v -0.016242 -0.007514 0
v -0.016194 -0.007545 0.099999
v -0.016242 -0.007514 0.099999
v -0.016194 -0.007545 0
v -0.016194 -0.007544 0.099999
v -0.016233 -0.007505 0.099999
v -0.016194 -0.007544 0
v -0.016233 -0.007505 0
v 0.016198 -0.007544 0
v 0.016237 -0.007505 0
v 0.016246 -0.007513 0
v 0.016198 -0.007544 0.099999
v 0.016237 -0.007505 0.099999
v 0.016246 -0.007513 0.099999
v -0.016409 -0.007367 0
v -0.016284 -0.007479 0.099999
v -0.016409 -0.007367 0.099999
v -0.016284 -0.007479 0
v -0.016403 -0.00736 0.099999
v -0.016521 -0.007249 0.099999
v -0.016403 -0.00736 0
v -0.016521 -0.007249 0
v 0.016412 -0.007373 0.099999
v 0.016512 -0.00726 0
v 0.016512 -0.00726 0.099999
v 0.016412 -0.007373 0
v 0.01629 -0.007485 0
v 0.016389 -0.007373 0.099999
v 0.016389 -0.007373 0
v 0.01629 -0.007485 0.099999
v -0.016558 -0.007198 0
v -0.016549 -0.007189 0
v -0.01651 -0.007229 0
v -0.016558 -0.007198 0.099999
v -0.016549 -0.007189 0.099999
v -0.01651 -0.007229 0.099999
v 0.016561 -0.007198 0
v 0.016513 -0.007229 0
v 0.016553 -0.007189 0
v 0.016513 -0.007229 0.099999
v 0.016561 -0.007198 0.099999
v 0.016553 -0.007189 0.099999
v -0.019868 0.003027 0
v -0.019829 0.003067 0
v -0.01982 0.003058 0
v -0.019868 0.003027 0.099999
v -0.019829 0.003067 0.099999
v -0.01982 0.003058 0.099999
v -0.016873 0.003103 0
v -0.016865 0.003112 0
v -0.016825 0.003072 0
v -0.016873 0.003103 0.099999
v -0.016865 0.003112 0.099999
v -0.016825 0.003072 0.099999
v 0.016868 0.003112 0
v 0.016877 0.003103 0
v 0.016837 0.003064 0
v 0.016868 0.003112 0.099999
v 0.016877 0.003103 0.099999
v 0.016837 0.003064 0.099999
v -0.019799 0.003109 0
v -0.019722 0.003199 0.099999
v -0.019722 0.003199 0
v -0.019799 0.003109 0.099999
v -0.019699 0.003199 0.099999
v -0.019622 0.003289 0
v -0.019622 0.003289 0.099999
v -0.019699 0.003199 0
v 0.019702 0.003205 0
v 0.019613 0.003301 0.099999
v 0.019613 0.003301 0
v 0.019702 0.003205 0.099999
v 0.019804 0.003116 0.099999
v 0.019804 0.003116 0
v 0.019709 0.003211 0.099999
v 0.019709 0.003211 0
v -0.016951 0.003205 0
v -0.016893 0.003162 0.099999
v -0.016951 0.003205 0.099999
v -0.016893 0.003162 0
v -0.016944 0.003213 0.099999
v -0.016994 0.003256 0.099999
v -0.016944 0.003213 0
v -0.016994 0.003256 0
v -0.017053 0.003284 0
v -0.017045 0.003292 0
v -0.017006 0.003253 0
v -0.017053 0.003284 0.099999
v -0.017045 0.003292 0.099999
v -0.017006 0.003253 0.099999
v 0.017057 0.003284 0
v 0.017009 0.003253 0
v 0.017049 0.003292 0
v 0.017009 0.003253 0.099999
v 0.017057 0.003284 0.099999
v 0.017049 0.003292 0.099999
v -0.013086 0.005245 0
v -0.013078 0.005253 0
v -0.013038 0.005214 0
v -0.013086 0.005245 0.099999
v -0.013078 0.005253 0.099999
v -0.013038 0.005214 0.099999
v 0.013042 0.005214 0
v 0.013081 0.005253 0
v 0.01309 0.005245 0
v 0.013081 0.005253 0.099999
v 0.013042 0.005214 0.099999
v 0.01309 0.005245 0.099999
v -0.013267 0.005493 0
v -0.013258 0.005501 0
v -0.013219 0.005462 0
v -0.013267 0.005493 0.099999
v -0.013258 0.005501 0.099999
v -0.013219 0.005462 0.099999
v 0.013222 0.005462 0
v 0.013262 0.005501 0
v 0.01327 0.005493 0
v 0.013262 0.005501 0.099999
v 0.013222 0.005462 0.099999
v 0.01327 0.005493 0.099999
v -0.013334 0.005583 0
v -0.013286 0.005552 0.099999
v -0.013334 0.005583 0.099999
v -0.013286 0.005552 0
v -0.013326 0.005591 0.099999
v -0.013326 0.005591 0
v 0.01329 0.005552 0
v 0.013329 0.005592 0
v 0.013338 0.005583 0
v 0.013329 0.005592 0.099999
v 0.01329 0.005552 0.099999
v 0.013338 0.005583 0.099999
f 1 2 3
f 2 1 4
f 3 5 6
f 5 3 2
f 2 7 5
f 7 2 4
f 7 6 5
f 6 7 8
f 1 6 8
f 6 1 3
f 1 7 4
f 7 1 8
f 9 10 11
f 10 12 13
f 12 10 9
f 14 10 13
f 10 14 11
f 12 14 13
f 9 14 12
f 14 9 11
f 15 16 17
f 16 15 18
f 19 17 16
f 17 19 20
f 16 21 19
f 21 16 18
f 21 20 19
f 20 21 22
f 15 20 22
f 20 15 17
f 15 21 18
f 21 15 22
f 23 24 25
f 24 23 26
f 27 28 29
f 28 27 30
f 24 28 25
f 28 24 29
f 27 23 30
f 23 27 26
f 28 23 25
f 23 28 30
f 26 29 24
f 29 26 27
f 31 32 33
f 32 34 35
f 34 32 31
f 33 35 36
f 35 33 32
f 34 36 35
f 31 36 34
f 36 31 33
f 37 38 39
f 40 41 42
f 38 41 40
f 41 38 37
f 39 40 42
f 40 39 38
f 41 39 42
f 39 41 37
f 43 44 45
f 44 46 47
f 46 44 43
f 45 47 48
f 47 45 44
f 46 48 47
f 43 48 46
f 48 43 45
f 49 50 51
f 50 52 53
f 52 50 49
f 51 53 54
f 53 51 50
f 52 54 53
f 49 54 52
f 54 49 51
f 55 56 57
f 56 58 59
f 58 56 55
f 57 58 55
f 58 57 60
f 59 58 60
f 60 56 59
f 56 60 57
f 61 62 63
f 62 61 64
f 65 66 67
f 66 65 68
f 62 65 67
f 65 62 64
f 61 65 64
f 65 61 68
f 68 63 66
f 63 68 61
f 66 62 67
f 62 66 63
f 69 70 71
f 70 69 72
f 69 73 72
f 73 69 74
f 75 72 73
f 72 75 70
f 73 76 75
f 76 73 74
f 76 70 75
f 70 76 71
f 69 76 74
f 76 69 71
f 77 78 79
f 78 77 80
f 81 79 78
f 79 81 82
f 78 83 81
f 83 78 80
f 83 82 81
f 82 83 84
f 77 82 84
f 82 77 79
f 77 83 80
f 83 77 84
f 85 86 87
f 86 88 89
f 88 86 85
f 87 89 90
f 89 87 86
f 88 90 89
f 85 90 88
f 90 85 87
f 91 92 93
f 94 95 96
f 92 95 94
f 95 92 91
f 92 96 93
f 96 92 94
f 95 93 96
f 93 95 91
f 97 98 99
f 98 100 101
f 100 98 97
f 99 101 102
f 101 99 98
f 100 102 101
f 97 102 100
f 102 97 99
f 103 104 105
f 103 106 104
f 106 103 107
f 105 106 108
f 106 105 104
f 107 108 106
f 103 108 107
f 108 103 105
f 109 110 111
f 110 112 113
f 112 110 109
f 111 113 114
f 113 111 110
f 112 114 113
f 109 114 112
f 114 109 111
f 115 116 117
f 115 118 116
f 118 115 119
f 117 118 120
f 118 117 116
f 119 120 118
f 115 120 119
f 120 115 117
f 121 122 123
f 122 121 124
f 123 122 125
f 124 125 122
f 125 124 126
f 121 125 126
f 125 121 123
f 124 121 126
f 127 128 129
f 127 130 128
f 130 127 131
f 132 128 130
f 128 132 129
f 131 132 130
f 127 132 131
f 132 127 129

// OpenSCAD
// Module names are of the form poly_<inkscape-path-id>().
// As a result you can associate a polygon in this OpenSCAD program with the
//  corresponding SVG element in the Inkscape document by looking for 
//  the XML element with the attribute id="inkscape-path-id".

// Paths have their own variables so they can be imported and used 
//  in polygon(points) structures in other programs.
// The NN_points is the list of all polygon XY vertices. 
// There may be an NN_paths variable as well. If it exists then it 
//  defines the nested paths. Both must be used in the 
//  polygon(points, paths) variant of the command.

Rail_Length = 100; //[1:1000]
    //Rail Length

/* [Hidden] */
profile_scale = 0.00081464002277141552302609575900030900991200121074907109924326770034023161126198515815847043291339169752789904632594341946365881760550373944832690714073227976779886371810300363975250103716194210393379334966466045163110500407735007025061232435585420288782965358137865140675882038360423316191322534868752932775556065779010844688920052532786226821690090756075392356443098617156690070701381886006997776941027860387693319506114702867952557261451099027928095132644439958277841263903822494815835290368075767258504151456363725213331180875138298107756731593094399033021637756158492573299361290387143134838476385702088408939587824142992457378943049675295818262392685143995282595065997580823270906266232724671853805416242533078791307442223552040174597217840094765776241643713732104089811779695580314854103252025368783878654821291488100348121313731248369379650902736107188178232447503860496367341394120576976228335891104896500555841054643711048609111589046463606931487253032609240412858175663079766820762703981801110889536931900572758670581387562666574895800580508223259365705764219757043002703813294882971316609563353011354763278729248344544028664482972969349398651727840541503980734936639062067522963803142510185121563655678719288248540078300427761423816241466373064406305748579962284491818130310055222276855687944927217213119889384865675674776790152901936598468738684771130782849519542589544953758993997510420866474114089734837365258307762836245214365973069610446989432586507419826831736253401708799117294969512382351486498216230576681405075327315686742503561634563841541909758891857611567857271301572595730999595514415440636593042155578222695524263262245493425642830169248957275607993208707236504554134413228511853540333155440843062414273260879232671015430964627763219604583864876408828189605944323318500834363933213735032240201024  ; //made in inkscape in mm

// helper functions to determine the X,Y dimensions of the profiles
function min_x(shape_points) = min([ for (x = shape_points) min(x[0])]);
function max_x(shape_points) = max([ for (x = shape_points) max(x[0])]);
function min_y(shape_points) = min([ for (x = shape_points) min(x[1])]);
function max_y(shape_points) = max([ for (x = shape_points) max(x[1])]);



height = Rail_Length*0.00100000249677948179063128876147533399919441764529342938400820585490995655279215866364035002747884582512842794930304804300535562945196122610324173374804477294933494478609441892473711390116544747113049603176652207166391968790217320423912487734926780876859305825363032886683226622392475537584851867724184056337192098521751192716928759721972625519290159030299560658597043095759800970751613303608555919754362258618614177137076206613497125511722881524338869786628884938489675874422985778165609762646605128781718498046507655344112256891030832452331041590500399989475224134254727715810349759602498830629633393917276656395953019350516762175016124997209089474262785747458973147099075697835012265593269770519513250345295624493458814551938744598077350573268643478925668343093763790468853936284269087911338578156630134161323586548027798465125192466654544725610398315501669835989911674814466211081996769970637328490727395472; //[1:1000]

linear_extrude(height = height, center = true);

width = 1.0;


path32_0_points = [[-18.928370,9.610490],[-19.054679,9.599590],[-19.177430,9.582790],[-19.233460,9.570090],[-19.283690,9.547990],[-19.294990,9.532790],[-19.449573,9.492490],[-19.474513,9.481790],[-20.142312,9.064750],[-20.559348,8.396960],[-20.570028,8.372060],[-20.610358,8.217480],[-20.625308,8.205980],[-20.648428,8.142580],[-20.661618,8.072980],[-20.677368,7.963480],[-20.688138,7.850900],[-20.708888,7.763600],[-20.688138,7.676400],[-20.677208,7.550090],[-20.660448,7.427340],[-20.647718,7.371340],[-20.636808,7.314240],[-20.612048,7.210310],[-20.630808,7.102680],[-20.664898,6.971090],[-20.674958,6.957390],[-20.720238,6.832720],[-20.736648,6.822720],[-20.757338,6.785420],[-20.764838,6.740020],[-20.803268,6.611120],[-20.813328,6.597420],[-20.858608,6.472750],[-20.868668,6.459050],[-20.913948,6.334380],[-20.930358,6.324380],[-20.951048,6.287080],[-20.958548,6.241680],[-20.996978,6.112770],[-21.007038,6.099070],[-21.052318,5.974400],[-21.062378,5.960700],[-21.107658,5.836030],[-21.124068,5.826030],[-21.144758,5.788730],[-21.152258,5.743330],[-21.190688,5.614420],[-21.200748,5.600720],[-21.246028,5.476050],[-21.256088,5.462350],[-21.301368,5.337680],[-21.317778,5.327680],[-21.338468,5.290380],[-21.345968,5.244980],[-21.384398,5.116080],[-21.394458,5.102380],[-21.439738,4.977710],[-21.449798,4.964010],[-21.495078,4.839340],[-21.511488,4.829340],[-21.532178,4.792040],[-21.539678,4.746640],[-21.578108,4.617730],[-21.588168,4.604030],[-21.633448,4.479360],[-21.649858,4.469360],[-21.670548,4.432060],[-21.678048,4.386660],[-21.716478,4.257750],[-21.726538,4.244050],[-21.771818,4.119380],[-21.781878,4.105680],[-21.827158,3.981010],[-21.843568,3.971010],[-21.864258,3.933710],[-21.871758,3.888310],[-21.910188,3.759410],[-21.920248,3.745710],[-21.965528,3.621040],[-21.975588,3.607340],[-22.020868,3.482670],[-22.037278,3.472670],[-22.057968,3.435370],[-22.065468,3.389970],[-22.103898,3.261060],[-22.113958,3.247360],[-22.159238,3.122690],[-22.169298,3.108990],[-22.214578,2.984320],[-22.230988,2.974320],[-22.251678,2.937020],[-22.259178,2.891620],[-22.297608,2.762710],[-22.307668,2.749010],[-22.352948,2.624340],[-22.363008,2.610640],[-22.408288,2.485970],[-22.424698,2.475970],[-22.445388,2.438670],[-22.452888,2.393270],[-22.491318,2.264360],[-22.501378,2.250660],[-22.546658,2.125990],[-22.556718,2.112290],[-22.601998,1.987620],[-22.618408,1.977620],[-22.639098,1.940320],[-22.646598,1.894920],[-22.685028,1.766020],[-22.695088,1.752320],[-22.740368,1.627650],[-22.756778,1.617650],[-22.777468,1.580350],[-22.784968,1.534950],[-22.823398,1.406040],[-22.833458,1.392340],[-22.878738,1.267670],[-22.888798,1.253970],[-22.934078,1.129300],[-22.950488,1.119300],[-22.971178,1.082000],[-22.978678,1.036600],[-23.017108,0.907690],[-23.027168,0.893990],[-23.072448,0.769320],[-23.082508,0.755620],[-23.127788,0.630950],[-23.144198,0.620950],[-23.164888,0.583650],[-23.172388,0.538250],[-23.210818,0.409350],[-23.220878,0.395650],[-23.266158,0.270980],[-23.276218,0.257280],[-23.321498,0.132610],[-23.337908,0.122610],[-23.358598,0.085310],[-23.366098,0.039910],[-23.404528,-0.089000],[-23.414588,-0.102700],[-23.459868,-0.227370],[-23.469928,-0.241070],[-23.515208,-0.365740],[-23.531618,-0.375740],[-23.552308,-0.413040],[-23.559808,-0.458440],[-23.598238,-0.587350],[-23.608298,-0.601050],[-23.653578,-0.725720],[-23.669988,-0.735720],[-23.690678,-0.773020],[-23.698178,-0.818420],[-23.736608,-0.947330],[-23.746668,-0.961030],[-23.791948,-1.085700],[-23.802008,-1.099400],[-23.847288,-1.224070],[-23.863698,-1.234070],[-23.884388,-1.271370],[-23.891888,-1.316770],[-23.930318,-1.445680],[-23.940378,-1.459380],[-23.985658,-1.584050],[-23.995718,-1.597750],[-24.040998,-1.722420],[-24.057408,-1.732420],[-24.078098,-1.769720],[-24.085598,-1.815120],[-24.124028,-1.944030],[-24.134088,-1.957730],[-24.179368,-2.082400],[-24.189428,-2.096100],[-24.234708,-2.220770],[-24.251118,-2.230770],[-24.271808,-2.268070],[-24.279308,-2.313470],[-24.317738,-2.442380],[-24.327798,-2.456080],[-24.373078,-2.580750],[-24.383138,-2.594450],[-24.428418,-2.719120],[-24.444828,-2.729120],[-24.465518,-2.766420],[-24.473018,-2.811820],[-24.511448,-2.940720],[-24.520548,-2.955020],[-24.566328,-2.980720],[-24.559428,-3.312810],[-24.549628,-3.370610],[-24.532118,-3.423710],[-24.516158,-3.444510],[-24.254036,-3.910650],[-23.736295,-4.226230],[-23.714415,-4.242030],[-23.674305,-4.258130],[-23.632115,-4.270830],[-23.537635,-4.288530],[-23.438775,-4.299130],[-22.494028,-4.320430],[-21.549669,-4.298530],[-21.464519,-4.288130],[-21.382609,-4.272530],[-21.326929,-4.259230],[-21.273859,-4.241730],[-21.251629,-4.226330],[-20.779600,-3.945730],[-20.499001,-3.473700],[-20.483261,-3.451700],[-20.467161,-3.411600],[-20.453971,-3.369700],[-20.437711,-3.302000],[-20.425301,-3.231900],[-20.409551,-3.039300],[-20.394001,-2.846670],[-20.383091,-2.789570],[-20.369251,-2.734270],[-20.355411,-2.678970],[-20.341231,-2.623870],[-20.328811,-2.581470],[-20.315321,-2.539770],[-20.300071,-2.485270],[-20.286231,-2.429970],[-20.272391,-2.374670],[-20.258551,-2.319370],[-20.244711,-2.264070],[-20.230871,-2.208770],[-20.217031,-2.153470],[-20.203191,-2.098170],[-20.189351,-2.042870],[-20.175511,-1.987570],[-20.161671,-1.932270],[-20.147831,-1.876970],[-20.133991,-1.821570],[-20.119811,-1.766470],[-20.107391,-1.724070],[-20.093901,-1.682370],[-20.078651,-1.627870],[-20.064811,-1.572570],[-20.050971,-1.517270],[-20.037131,-1.461970],[-20.023291,-1.406670],[-20.009451,-1.351370],[-19.995611,-1.296070],[-19.981771,-1.240770],[-19.967931,-1.185470],[-19.954091,-1.130170],[-19.940251,-1.074870],[-19.926411,-1.019570],[-19.912571,-0.964270],[-19.898391,-0.909170],[-19.885971,-0.866770],[-19.872481,-0.825070],[-19.857231,-0.770570],[-19.843391,-0.715270],[-19.829551,-0.659970],[-19.815711,-0.604670],[-19.801871,-0.549370],[-19.788031,-0.494070],[-19.774191,-0.438770],[-19.760351,-0.383470],[-19.746511,-0.328170],[-19.732671,-0.272770],[-19.718831,-0.217470],[-19.704651,-0.162370],[-19.692231,-0.119970],[-19.678741,-0.078270],[-19.663491,-0.023770],[-19.649651,0.031530],[-19.635811,0.086830],[-19.621971,0.142130],[-19.608131,0.197430],[-19.594291,0.252730],[-19.580451,0.308030],[-19.566611,0.363330],[-19.552771,0.418630],[-19.538931,0.473930],[-19.525091,0.529230],[-19.511251,0.584530],[-19.497411,0.639830],[-19.483231,0.694930],[-19.470811,0.737330],[-19.457321,0.779030],[-19.442071,0.833530],[-19.428231,0.888830],[-19.414391,0.944130],[-19.400551,0.999430],[-19.386711,1.054730],[-19.372871,1.110030],[-19.359031,1.165330],[-19.345191,1.220630],[-19.331351,1.275930],[-19.317511,1.331330],[-19.303671,1.386630],[-19.289491,1.441730],[-19.277071,1.484130],[-19.263581,1.525830],[-19.248331,1.580330],[-19.234491,1.635630],[-19.220651,1.690930],[-19.206811,1.746230],[-19.192971,1.801530],[-19.179131,1.856830],[-19.165291,1.912130],[-19.151451,1.967430],[-19.137611,2.022730],[-19.123771,2.078030],[-19.109931,2.133330],[-19.096091,2.188630],[-19.082251,2.243930],[-19.068071,2.299030],[-19.055651,2.341430],[-19.042161,2.383130],[-19.026911,2.437630],[-19.013071,2.492930],[-18.999231,2.548230],[-18.985391,2.603530],[-18.971551,2.658830],[-18.957711,2.714130],[-18.943871,2.769430],[-18.930031,2.824730],[-18.916191,2.880030],[-18.902351,2.935430],[-18.888511,2.990730],[-18.874671,3.046030],[-18.860831,3.101330],[-18.846651,3.156430],[-18.834231,3.198830],[-18.820741,3.240530],[-18.805491,3.295030],[-18.791651,3.350330],[-18.777811,3.405630],[-18.763971,3.460930],[-18.750131,3.516230],[-18.736291,3.571530],[-18.722451,3.626830],[-18.708611,3.682130],[-18.694771,3.737430],[-18.680931,3.792730],[-18.667091,3.848030],[-18.652911,3.903130],[-18.640491,3.945530],[-18.627001,3.987230],[-18.611751,4.041730],[-18.597911,4.097030],[-18.584071,4.152330],[-18.570231,4.207630],[-18.556391,4.262930],[-18.542551,4.318230],[-18.528711,4.373530],[-18.514871,4.428830],[-18.501031,4.484130],[-18.487191,4.539530],[-18.473351,4.594830],[-18.459511,4.650130],[-18.445671,4.705430],[-18.431491,4.760530],[-18.419071,4.802930],[-18.405581,4.844630],[-18.390331,4.899130],[-18.376491,4.954430],[-18.362651,5.009730],[-18.348811,5.065030],[-18.334971,5.120330],[-18.321131,5.175630],[-18.307291,5.230930],[-18.293451,5.286230],[-18.279611,5.341530],[-18.265771,5.396830],[-18.251931,5.452130],[-18.238091,5.507430],[-18.224251,5.562730],[-18.210071,5.617830],[-18.197651,5.660230],[-18.184161,5.701930],[-18.168911,5.756430],[-18.155071,5.811730],[-18.141231,5.867030],[-18.127391,5.922330],[-18.113551,5.977630],[-18.099711,6.032930],[-18.085871,6.088230],[-18.072031,6.143630],[-18.058191,6.198930],[-18.044011,6.254030],[-18.031591,6.296430],[-18.017411,6.337730],[-18.004951,6.364430],[-17.991541,6.428630],[-17.983141,6.411430],[-17.971691,6.396130],[-17.951491,6.452530],[-17.767225,6.648970],[-17.678565,6.687770],[-17.647985,6.696770],[-17.618915,6.708370],[-17.577625,6.722570],[-17.533445,6.732570],[-17.346723,6.757670],[-17.160000,6.732570],[-17.115820,6.722570],[-17.074310,6.708770],[-17.032870,6.694970],[-16.955090,6.681270],[-16.973170,6.674270],[-16.988480,6.662870],[-16.930890,6.643170],[-16.857600,6.610470],[-16.876330,6.604470],[-16.836310,6.542170],[-16.768270,6.501870],[-16.820980,6.564170],[-16.760590,6.513170],[-16.716870,6.418670],[-16.701490,6.395070],[-16.687650,6.367370],[-16.676080,6.338270],[-16.661900,6.296970],[-16.649480,6.254570],[-16.635300,6.199470],[-16.624390,6.142270],[-16.606680,0.504150],[-16.613680,-5.149280],[-16.266531,-5.608320],[-15.902398,-6.067360],[-15.938128,-6.005060],[-15.990838,-5.942760],[-15.930448,-5.993760],[-15.886728,-6.088260],[-15.875638,-6.114560],[-15.847878,-6.136460],[-15.875638,-6.158360],[-15.886068,-6.186360],[-15.899478,-6.250460],[-15.907878,-6.233260],[-15.919328,-6.217960],[-15.939088,-6.275560],[-15.971788,-6.348860],[-15.980588,-6.337060],[-15.957478,-6.288660],[-16.159183,-6.589360],[-16.191803,-6.652160],[-16.201943,-6.641460],[-16.178573,-6.593060],[-16.463668,-7.004250],[-16.496178,-7.067250],[-16.502778,-7.051250],[-16.491258,-7.015450],[-16.597988,-7.144130],[-16.674738,-7.254880],[-16.614178,-7.352880],[-16.540398,-7.450880],[-16.546898,-7.418880],[-16.534248,-7.406980],[-16.518808,-7.454480],[-16.123793,-8.087300],[-16.131893,-8.055400],[-16.119243,-8.043500],[-16.103663,-8.090700],[-15.800061,-8.577750],[-15.811041,-8.542250],[-15.804441,-8.526250],[-15.771341,-8.588250],[-15.598808,-8.862050],[-15.620888,-8.813650],[-15.610748,-8.802950],[-15.577648,-8.864950],[-15.405116,-9.138750],[-15.427196,-9.090350],[-15.417056,-9.079650],[-15.383956,-9.141650],[-15.211424,-9.415450],[-15.233504,-9.367050],[-15.223364,-9.356350],[-15.189814,-9.417650],[-15.130344,-9.553090],[-15.016559,-9.631990],[-14.985789,-9.412960],[-14.976289,-9.238440],[-14.949339,-8.758570],[-14.978139,-8.680570],[-14.985539,-8.593570],[-14.999379,-8.510570],[-15.013219,-8.427570],[-15.027059,-8.344570],[-15.040899,-8.261570],[-15.055509,-8.179070],[-15.069099,-8.109770],[-15.083939,-8.041270],[-15.097479,-7.985770],[-15.111319,-7.930470],[-15.125159,-7.875170],[-15.138999,-7.819870],[-15.152839,-7.764570],[-15.166679,-7.709270],[-15.180519,-7.653970],[-15.194359,-7.598670],[-15.208199,-7.543370],[-15.222039,-7.488070],[-15.235879,-7.432770],[-15.247779,-7.376270],[-15.273529,-7.340870],[-15.247779,-7.305470],[-15.235879,-7.248970],[-15.221699,-7.193870],[-15.209279,-7.151470],[-15.195439,-7.109970],[-15.181599,-7.068470],[-15.168109,-7.026770],[-15.152859,-6.972270],[-15.138679,-6.917170],[-15.126259,-6.874770],[-15.112419,-6.833270],[-15.098579,-6.791770],[-15.084739,-6.750270],[-15.070899,-6.708770],[-15.057409,-6.667070],[-15.042159,-6.612570],[-15.027979,-6.557470],[-15.015559,-6.515070],[-15.001719,-6.473570],[-14.987879,-6.432070],[-14.974039,-6.390570],[-14.960199,-6.349070],[-14.953899,-6.302870],[-14.919749,-6.143790],[-14.952829,-6.109290],[-14.960229,-6.063790],[-14.974069,-6.022290],[-14.987909,-5.980790],[-15.001749,-5.939290],[-15.015589,-5.897790],[-15.029429,-5.856290],[-15.043269,-5.814790],[-15.057109,-5.773290],[-15.070949,-5.731790],[-15.080449,-5.687590],[-15.105559,-5.583880],[-15.084809,-5.477470],[-15.064059,-5.391870],[-15.034759,-5.293370],[-15.022359,-5.266070],[-14.991779,-5.257070],[-14.966949,-5.238670],[-14.957449,-5.221870],[-14.829941,-5.181170],[-14.802541,-5.172170],[-14.766511,0.442550],[-14.749091,6.058670],[-14.737171,6.129070],[-14.723041,6.198070],[-14.710211,6.254070],[-14.696031,6.309170],[-14.683611,6.351570],[-14.669431,6.392870],[-14.657861,6.421970],[-14.651661,6.454370],[-14.607931,6.550170],[-14.589911,6.593470],[-14.579901,6.577270],[-14.568451,6.561970],[-14.548051,6.617870],[-14.243476,6.918430],[-14.190776,6.939830],[-14.206346,6.950830],[-14.223566,6.958830],[-14.159416,6.972230],[-14.134066,6.986930],[-14.106396,7.000730],[-14.081566,7.019130],[-14.072066,7.035930],[-13.942283,7.072930],[-13.883233,7.080930],[-13.826793,7.093030],[-13.744123,7.107430],[-13.660413,7.120130],[0.002238,7.144330],[13.664878,7.120130],[13.748578,7.107430],[13.831278,7.093030],[13.887678,7.080930],[13.946678,7.072930],[14.076468,7.035930],[14.086468,7.019130],[14.111268,7.000730],[14.138968,6.986930],[14.164368,6.972230],[14.228468,6.958830],[14.211268,6.950830],[14.195668,6.939830],[14.248368,6.918430],[14.552948,6.617870],[14.573348,6.561970],[14.584748,6.577270],[14.594748,6.593470],[14.612748,6.550170],[14.656448,6.454370],[14.662448,6.421970],[14.674048,6.392870],[14.688248,6.351570],[14.700648,6.309170],[14.714848,6.254070],[14.727648,6.198070],[14.741748,6.129070],[14.753648,6.058670],[14.771048,0.442550],[14.807048,-5.172170],[14.834448,-5.181170],[14.961958,-5.221870],[14.971958,-5.238670],[14.996758,-5.257070],[15.027358,-5.266070],[15.039758,-5.293370],[15.069058,-5.391870],[15.089858,-5.477470],[15.110558,-5.583880],[15.085458,-5.687590],[15.075458,-5.731790],[15.061658,-5.773290],[15.047858,-5.814790],[15.034058,-5.856290],[15.020258,-5.897790],[15.006458,-5.939290],[14.992658,-5.980790],[14.978858,-6.022290],[14.965058,-6.063790],[14.958058,-6.109290],[14.924958,-6.143790],[14.959058,-6.302870],[14.965058,-6.349070],[14.978858,-6.390570],[14.992658,-6.432070],[15.006458,-6.473570],[15.020258,-6.515070],[15.032658,-6.557470],[15.046858,-6.612570],[15.062058,-6.667070],[15.075558,-6.708770],[15.089358,-6.750270],[15.103158,-6.791770],[15.116958,-6.833270],[15.130758,-6.874770],[15.143158,-6.917170],[15.157358,-6.972270],[15.172558,-7.026770],[15.186058,-7.068470],[15.199858,-7.109970],[15.213658,-7.151470],[15.226058,-7.193870],[15.240258,-7.248970],[15.252158,-7.305470],[15.277958,-7.340870],[15.252158,-7.376270],[15.240258,-7.432770],[15.226458,-7.488070],[15.212658,-7.543370],[15.198858,-7.598670],[15.185058,-7.653970],[15.171258,-7.709270],[15.157458,-7.764570],[15.143658,-7.819870],[15.129858,-7.875170],[15.116058,-7.930470],[15.102258,-7.985770],[15.088758,-8.041270],[15.073958,-8.109770],[15.060358,-8.179070],[15.045758,-8.261570],[15.031958,-8.344570],[15.018158,-8.427570],[15.004358,-8.510570],[14.990558,-8.593570],[14.983558,-8.680570],[14.954758,-8.758570],[14.981658,-9.238440],[14.990658,-9.412960],[15.021458,-9.631990],[15.135238,-9.553090],[15.194738,-9.417650],[15.228338,-9.356350],[15.238438,-9.367050],[15.216338,-9.415450],[15.388868,-9.141650],[15.421968,-9.079650],[15.432168,-9.090350],[15.410068,-9.138750],[15.582598,-8.864950],[15.615698,-8.802950],[15.625798,-8.813650],[15.603698,-8.862050],[15.776238,-8.588250],[15.809338,-8.526250],[15.816338,-8.542250],[15.805338,-8.577750],[16.108948,-8.090700],[16.124548,-8.043500],[16.137248,-8.055400],[16.129248,-8.087300],[16.524268,-7.454480],[16.539668,-7.406980],[16.552268,-7.418880],[16.545268,-7.450880],[16.619068,-7.352880],[16.679668,-7.254880],[16.602968,-7.144130],[16.496238,-7.015450],[16.507738,-7.051250],[16.500738,-7.067250],[16.468238,-7.004250],[16.183148,-6.593060],[16.206548,-6.641460],[16.196448,-6.652160],[16.163848,-6.589360],[15.962148,-6.288660],[15.985248,-6.337060],[15.976248,-6.348860],[15.943548,-6.275560],[15.923748,-6.217960],[15.912348,-6.233260],[15.904348,-6.250460],[15.890948,-6.186360],[15.880548,-6.158360],[15.852748,-6.136460],[15.880548,-6.114560],[15.891648,-6.088260],[15.935348,-5.993760],[15.995748,-5.942760],[15.943048,-6.005060],[15.907348,-6.067360],[16.271488,-5.608320],[16.618638,-5.149280],[16.611638,0.504150],[16.629338,6.142270],[16.640238,6.199470],[16.654438,6.254570],[16.666838,6.296970],[16.681038,6.338270],[16.692638,6.367370],[16.706438,6.395070],[16.721838,6.418670],[16.765538,6.513170],[16.825938,6.564170],[16.771238,6.494970],[16.819638,6.521170],[16.874338,6.602170],[16.862538,6.611170],[16.935838,6.643870],[16.993438,6.663570],[16.978138,6.674970],[16.960038,6.681970],[17.037838,6.695670],[17.079238,6.709470],[17.120738,6.723270],[17.164938,6.733270],[17.351658,6.758370],[17.538378,6.733270],[17.582578,6.723270],[17.623878,6.709070],[17.652978,6.697470],[17.683578,6.688470],[17.772278,6.649670],[17.956538,6.453230],[17.976738,6.396830],[17.988138,6.412130],[17.996138,6.429330],[18.009538,6.365130],[18.022038,6.338430],[18.036238,6.297130],[18.048638,6.254730],[18.062838,6.199630],[18.076638,6.144330],[18.090438,6.088930],[18.104238,6.033630],[18.118038,5.978330],[18.131838,5.923030],[18.145638,5.867730],[18.159438,5.812430],[18.173238,5.757130],[18.188538,5.702630],[18.202038,5.660930],[18.214438,5.618530],[18.228638,5.563430],[18.242438,5.508130],[18.256238,5.452830],[18.270038,5.397530],[18.283838,5.342230],[18.297638,5.286930],[18.311438,5.231630],[18.325238,5.176330],[18.339038,5.121030],[18.352838,5.065730],[18.366638,5.010430],[18.380438,4.955130],[18.394238,4.899830],[18.409538,4.845330],[18.423038,4.803630],[18.435438,4.761230],[18.449638,4.706130],[18.463438,4.650830],[18.477238,4.595530],[18.491038,4.540230],[18.504838,4.484830],[18.518638,4.429530],[18.532438,4.374230],[18.546238,4.318930],[18.560038,4.263630],[18.573838,4.208330],[18.587638,4.153030],[18.601438,4.097730],[18.615238,4.042430],[18.630438,3.987930],[18.643938,3.946230],[18.656338,3.903830],[18.670538,3.848730],[18.684338,3.793430],[18.698138,3.738130],[18.711938,3.682830],[18.725738,3.627530],[18.739538,3.572230],[18.753338,3.516930],[18.767138,3.461630],[18.780938,3.406330],[18.794738,3.351030],[18.808538,3.295730],[18.823838,3.241230],[18.837338,3.199530],[18.849738,3.157130],[18.863938,3.102030],[18.877738,3.046730],[18.891538,2.991430],[18.905338,2.936130],[18.919138,2.880730],[18.932938,2.825430],[18.946738,2.770130],[18.960538,2.714830],[18.974338,2.659530],[18.988138,2.604230],[19.001938,2.548930],[19.015738,2.493630],[19.029538,2.438330],[19.044738,2.383830],[19.058238,2.342130],[19.070638,2.299730],[19.084838,2.244630],[19.098638,2.189330],[19.112438,2.134030],[19.126238,2.078730],[19.140038,2.023430],[19.153838,1.968130],[19.167638,1.912830],[19.181438,1.857530],[19.195238,1.802230],[19.209038,1.746930],[19.222838,1.691630],[19.236638,1.636330],[19.250438,1.581030],[19.265638,1.526530],[19.279138,1.484830],[19.291538,1.442430],[19.305738,1.387330],[19.319538,1.332030],[19.333338,1.276630],[19.347138,1.221330],[19.360938,1.166030],[19.374738,1.110730],[19.388538,1.055430],[19.402338,1.000130],[19.416138,0.944830],[19.429938,0.889530],[19.443738,0.834230],[19.458938,0.779730],[19.472438,0.738030],[19.484838,0.695630],[19.499038,0.640530],[19.512838,0.585230],[19.526638,0.529930],[19.540438,0.474630],[19.554238,0.419330],[19.568038,0.364030],[19.581838,0.308730],[19.595638,0.253430],[19.609438,0.198130],[19.623238,0.142830],[19.637038,0.087530],[19.650838,0.032230],[19.664638,-0.023070],[19.679938,-0.077570],[19.693438,-0.119270],[19.705838,-0.161670],[19.720038,-0.216770],[19.733838,-0.272070],[19.747638,-0.327470],[19.761438,-0.382770],[19.775238,-0.438070],[19.789038,-0.493370],[19.802838,-0.548670],[19.816638,-0.603970],[19.830438,-0.659270],[19.844238,-0.714570],[19.858038,-0.769870],[19.873238,-0.824370],[19.886738,-0.866070],[19.899138,-0.908470],[19.913338,-0.963570],[19.927138,-1.018870],[19.940938,-1.074170],[19.954738,-1.129470],[19.968538,-1.184770],[19.982338,-1.240070],[19.996138,-1.295370],[20.009938,-1.350670],[20.023738,-1.405970],[20.037538,-1.461270],[20.051338,-1.516570],[20.065138,-1.571870],[20.078938,-1.627170],[20.094238,-1.681670],[20.107738,-1.723370],[20.120138,-1.765770],[20.134338,-1.820870],[20.148138,-1.876270],[20.161938,-1.931570],[20.175738,-1.986870],[20.189538,-2.042170],[20.203338,-2.097470],[20.217138,-2.152770],[20.230938,-2.208070],[20.244738,-2.263370],[20.258538,-2.318670],[20.272338,-2.373970],[20.286138,-2.429270],[20.299938,-2.484570],[20.315138,-2.539070],[20.328638,-2.580770],[20.341038,-2.623170],[20.355238,-2.678270],[20.369038,-2.733570],[20.382838,-2.788870],[20.393738,-2.845970],[20.409238,-3.038600],[20.424938,-3.231200],[20.437338,-3.301300],[20.453638,-3.369000],[20.466838,-3.410900],[20.482938,-3.451000],[20.498638,-3.473000],[20.779238,-3.945030],[21.251258,-4.225630],[21.273458,-4.241030],[21.326558,-4.258530],[21.382258,-4.271830],[21.464158,-4.287430],[21.549258,-4.297830],[22.493618,-4.319730],[23.438368,-4.298430],[23.537268,-4.287830],[23.631768,-4.270130],[23.673968,-4.257430],[23.714068,-4.241330],[23.735968,-4.225530],[24.253708,-3.909950],[24.515828,-3.443810],[24.531828,-3.423010],[24.549328,-3.369910],[24.559328,-3.312110],[24.566328,-2.980020],[24.520528,-2.954320],[24.511528,-2.940020],[24.473128,-2.811120],[24.466128,-2.765720],[24.445428,-2.728420],[24.429028,-2.718420],[24.383728,-2.593750],[24.373628,-2.580050],[24.328328,-2.455380],[24.318228,-2.441680],[24.279828,-2.312770],[24.272828,-2.267370],[24.252128,-2.230070],[24.235728,-2.220070],[24.190428,-2.095400],[24.180328,-2.081700],[24.135028,-1.957030],[24.124928,-1.943330],[24.086528,-1.814420],[24.079528,-1.769020],[24.058828,-1.731720],[24.042428,-1.721720],[23.997128,-1.597050],[23.987028,-1.583350],[23.941728,-1.458680],[23.931628,-1.444980],[23.893228,-1.316070],[23.886228,-1.270670],[23.865528,-1.233370],[23.849128,-1.223370],[23.803828,-1.098700],[23.793728,-1.085000],[23.748428,-0.960330],[23.738328,-0.946630],[23.699928,-0.817720],[23.692928,-0.772320],[23.672228,-0.735020],[23.655828,-0.725020],[23.610528,-0.600350],[23.600428,-0.586650],[23.562028,-0.457740],[23.555028,-0.412340],[23.534328,-0.375040],[23.517928,-0.365040],[23.472628,-0.240370],[23.462528,-0.226670],[23.417228,-0.102000],[23.407128,-0.088300],[23.368728,0.040610],[23.361728,0.086010],[23.341028,0.123310],[23.324628,0.133310],[23.279328,0.257980],[23.269228,0.271680],[23.223928,0.396350],[23.213828,0.410050],[23.175428,0.538950],[23.168428,0.584350],[23.147728,0.621650],[23.131328,0.631650],[23.086028,0.756320],[23.075928,0.770020],[23.030628,0.894690],[23.020528,0.908390],[22.982128,1.037300],[22.975128,1.082700],[22.954428,1.120000],[22.938028,1.130000],[22.892728,1.254670],[22.882628,1.268370],[22.837328,1.393040],[22.827228,1.406740],[22.788828,1.535650],[22.781828,1.581050],[22.761128,1.618350],[22.744728,1.628350],[22.699428,1.753020],[22.689328,1.766720],[22.650928,1.895620],[22.643928,1.941020],[22.623228,1.978320],[22.606828,1.988320],[22.561528,2.112990],[22.551428,2.126690],[22.506128,2.251360],[22.496028,2.265060],[22.457628,2.393970],[22.450628,2.439370],[22.429928,2.476670],[22.413528,2.486670],[22.368228,2.611340],[22.358128,2.625040],[22.312828,2.749710],[22.302728,2.763410],[22.264328,2.892320],[22.257328,2.937720],[22.236628,2.975020],[22.220228,2.985020],[22.174928,3.109690],[22.164828,3.123390],[22.119528,3.248060],[22.109428,3.261760],[22.071028,3.390670],[22.064028,3.436070],[22.043328,3.473370],[22.026928,3.483370],[21.981628,3.608040],[21.971528,3.621740],[21.926228,3.746410],[21.916128,3.760110],[21.877728,3.889010],[21.870728,3.934410],[21.850028,3.971710],[21.833628,3.981710],[21.788328,4.106380],[21.778228,4.120080],[21.732928,4.244750],[21.722828,4.258450],[21.684428,4.387360],[21.677428,4.432760],[21.656728,4.470060],[21.640328,4.480060],[21.595028,4.604730],[21.584928,4.618430],[21.546528,4.747340],[21.539528,4.792740],[21.518828,4.830040],[21.502428,4.840040],[21.457128,4.964710],[21.447028,4.978410],[21.401728,5.103080],[21.391628,5.116780],[21.353228,5.245680],[21.346228,5.291080],[21.325528,5.328380],[21.309128,5.338380],[21.263828,5.463050],[21.253728,5.476750],[21.208428,5.601420],[21.198328,5.615120],[21.159928,5.744030],[21.152928,5.789430],[21.132228,5.826730],[21.115828,5.836730],[21.070528,5.961400],[21.060428,5.975100],[21.015128,6.099770],[21.005028,6.113470],[20.966628,6.242380],[20.959628,6.287780],[20.938928,6.325080],[20.922528,6.335080],[20.877228,6.459750],[20.867128,6.473450],[20.821828,6.598120],[20.811728,6.611820],[20.773328,6.740720],[20.766328,6.786120],[20.745628,6.823420],[20.729228,6.833420],[20.683928,6.958090],[20.673828,6.971790],[20.639728,7.103380],[20.620928,7.211010],[20.645728,7.314940],[20.656628,7.372040],[20.669328,7.428040],[20.686128,7.550790],[20.697028,7.677100],[20.717728,7.764300],[20.697028,7.851600],[20.686228,7.964180],[20.670528,8.073680],[20.657328,8.143280],[20.634228,8.206680],[20.619328,8.218180],[20.579028,8.372760],[20.568328,8.397660],[20.151288,9.065450],[19.483488,9.482490],[19.458588,9.493190],[19.304008,9.533490],[19.292708,9.548690],[19.242508,9.570790],[19.186508,9.583490],[19.063758,9.600290],[18.937448,9.611190],[0.006808,9.631990],[-18.923820,9.611190],[-18.928370,9.610490],[20.810228,-3.927140],[20.846428,-3.982440],[20.782528,-3.927140],[20.746328,-3.871840],[20.810228,-3.927140],[20.810228,-3.927140],[-16.516829,-5.200000],[-16.480579,-5.255300],[-16.544499,-5.200000],[-16.580749,-5.144700],[-16.516829,-5.200000],[-16.516829,-5.200000],[16.590528,-5.154200],[16.528228,-5.216500],[16.465928,-5.269200],[16.518628,-5.206900],[16.590428,-5.154200],[16.590528,-5.154200],[-16.416454,-5.331420],[-16.426904,-5.341820],[-16.464884,-5.282920],[-16.416464,-5.331320],[-16.416454,-5.331420],[16.479848,-5.293420],[16.431448,-5.341820],[16.420948,-5.331420],[16.479848,-5.293420],[16.479848,-5.293420],[-16.333444,-5.442080],[-16.343894,-5.452480],[-16.381864,-5.393580],[-16.333444,-5.441980],[-16.333444,-5.442080],[16.396838,-5.404080],[16.348438,-5.452480],[16.337938,-5.442080],[16.396838,-5.404080],[16.396838,-5.404080],[-16.250433,-5.552740],[-16.260883,-5.563140],[-16.298863,-5.504240],[-16.250443,-5.552640],[-16.250433,-5.552740],[16.313828,-5.514740],[16.265428,-5.563140],[16.254928,-5.552740],[16.313828,-5.514740],[16.313828,-5.514740],[-16.167423,-5.663400],[-16.177873,-5.673800],[-16.215843,-5.614900],[-16.167423,-5.663300],[-16.167423,-5.663400],[16.230818,-5.625400],[16.182418,-5.673800],[16.171918,-5.663400],[16.230818,-5.625400],[16.230818,-5.625400],[-16.084412,-5.774060],[-16.094862,-5.784460],[-16.132842,-5.725560],[-16.084422,-5.773960],[-16.084412,-5.774060],[16.147808,-5.736060],[16.099408,-5.784460],[16.089008,-5.774060],[16.147908,-5.736060],[16.147808,-5.736060],[-16.001402,-5.884810],[-16.011852,-5.895210],[-16.049822,-5.836310],[-16.001402,-5.884710],[-16.001402,-5.884810],[16.064798,-5.846810],[16.016398,-5.895210],[16.005998,-5.884810],[16.064898,-5.846810],[16.064798,-5.846810],[-16.530665,-7.119720],[-16.579085,-7.168120],[-16.589535,-7.157720],[-16.530665,-7.119720],[-16.530665,-7.119720],[16.594058,-7.157720],[16.583658,-7.168120],[16.535258,-7.119720],[16.594158,-7.157720],[16.594058,-7.157720],[-14.414937,6.774220],[-14.552247,6.628950],[-14.406979,6.766260],[-14.269668,6.919480],[-14.414937,6.774220],[-14.414937,6.774220],[14.390748,6.781220],[14.540858,6.642870],[14.418418,6.781220],[14.268318,6.919570],[14.390748,6.781220],[14.390748,6.781220],[-17.874409,6.552950],[-17.955679,6.463050],[-17.865749,6.544350],[-17.784479,6.642950],[-17.874409,6.553050],[-17.874409,6.552950]];
path32_0_paths = [[0,1,2,3,4,5,6,7,8,9,10,11,12,13,14,15,16,17,18,19,20,21,22,23,24,25,26,27,28,29,30,31,32,33,34,35,36,37,38,39,40,41,42,43,44,45,46,47,48,49,50,51,52,53,54,55,56,57,58,59,60,61,62,63,64,65,66,67,68,69,70,71,72,73,74,75,76,77,78,79,80,81,82,83,84,85,86,87,88,89,90,91,92,93,94,95,96,97,98,99,100,101,102,103,104,105,106,107,108,109,110,111,112,113,114,115,116,117,118,119,120,121,122,123,124,125,126,127,128,129,130,131,132,133,134,135,136,137,138,139,140,141,142,143,144,145,146,147,148,149,150,151,152,153,154,155,156,157,158,159,160,161,162,163,164,165,166,167,168,169,170,171,172,173,174,175,176,177,178,179,180,181,182,183,184,185,186,187,188,189,190,191,192,193,194,195,196,197,198,199,200,201,202,203,204,205,206,207,208,209,210,211,212,213,214,215,216,217,218,219,220,221,222,223,224,225,226,227,228,229,230,231,232,233,234,235,236,237,238,239,240,241,242,243,244,245,246,247,248,249,250,251,252,253,254,255,256,257,258,259,260,261,262,263,264,265,266,267,268,269,270,271,272,273,274,275,276,277,278,279,280,281,282,283,284,285,286,287,288,289,290,291,292,293,294,295,296,297,298,299,300,301,302,303,304,305,306,307,308,309,310,311,312,313,314,315,316,317,318,319,320,321,322,323,324,325,326,327,328,329,330,331,332,333,334,335,336,337,338,339,340,341,342,343,344,345,346,347,348,349,350,351,352,353,354,355,356,357,358,359,360,361,362,363,364,365,366,367,368,369,370,371,372,373,374,375,376,377,378,379,380,381,382,383,384,385,386,387,388,389,390,391,392,393,394,395,396,397,398,399,400,401,402,403,404,405,406,407,408,409,410,411,412,413,414,415,416,417,418,419,420,421,422,423,424,425,426,427,428,429,430,431,432,433,434,435,436,437,438,439,440,441,442,443,444,445,446,447,448,449,450,451,452,453,454,455,456,457,458,459,460,461,462,463,464,465,466,467,468,469,470,471,472,473,474,475,476,477,478,479,480,481,482,483,484,485,486,487,488,489,490,491,492,493,494,495,496,497,498,499,500,501,502,503,504,505,506,507,508,509,510,511,512,513,514,515,516,517,518,519,520,521,522,523,524,525,526,527,528,529,530,531,532,533,534,535,536,537,538,539,540,541,542,543,544,545,546,547,548,549,550,551,552,553,554,555,556,557,558,559,560,561,562,563,564,565,566,567,568,569,570,571,572,573,574,575,576,577,578,579,580,581,582,583,584,585,586,587,588,589,590,591,592,593,594,595,596,597,598,599,600,601,602,603,604,605,606,607,608,609,610,611,612,613,614,615,616,617,618,619,620,621,622,623,624,625,626,627,628,629,630,631,632,633,634,635,636,637,638,639,640,641,642,643,644,645,646,647,648,649,650,651,652,653,654,655,656,657,658,659,660,661,662,663,664,665,666,667,668,669,670,671,672,673,674,675,676,677,678,679,680,681,682,683,684,685,686,687,688,689,690,691,692,693,694,695,696,697,698,699,700,701,702,703,704,705,706,707,708,709,710,711,712,713,714,715,716,717,718,719,720,721,722,723,724,725,726,727,728,729,730,731,732,733,734,735,736,737,738,739,740,741,742,743,744,745,746,747,748,749,750,751,752,753,754,755,756,757,758,759,760,761,762,763,764,765,766,767,768,769,770,771,772,773,774,775,776,777,778,779,780,781,782,783,784,785,786,787,788,789,790,791,792,793,794,795,796,797,798,799,800,801,802,803,804,805,806,807,808,809,810,811,812,813,814,815,816,817,818,819,820,821,822,823,824,825,826,827,828,829,830,831,832,833,834,835,836,837,838,839,840,841,842,843,844,845,846,847,848,849,850,851,852,853,854,855,856,857,858,859,860,861,862,863,864,865,866,867,868,869,870,871,872,873,874,875,876,877,878,879,880,881,882,883,884,885,886,887,888,889,890,891,892,893,894,895,896,897,898,899,900,901,902,903,904,905,906,907,908,909,910,911,912,913,914,915,916,917,918,919,920,921,922,923,924,925,926,927,928,929,930,931,932,933,934,935,936,937,938,939,940,941,942,943,944,945,946,947,948,949,950,951,952,953,954,955,956,957,958,959,960,961,962,963,964,965,966,967,968,969,970,971,972,973,974,975,976,977,978,979,980,981,982,983,984,985,986,987,988,989,990,991,992,993,994,995,996,997,998,999,1000,1001,1002,1003,1004,1005,1006,1007,1008,1009,1010,1011,1012,1013,1014,1015,1016,1017,1018,1019,1020,1021,1022,1023,1024,1025,1026,1027,1028,1029,1030,1031,1032,1033,1034,1035,1036,1037,1038,1039,1040,1041,1042,1043,1044,1045,1046,1047,1048,1049,1050,1051,1052,1053,1054,1055,1056,1057,1058,1059,1060,1061,1062,1063,1064,1065,1066,1067,1068,1069,1070,1071,1072,1073,1074,1075,1076,1077,1078,1079,1080,1081,1082,1083,1084,1085,1086,1087,1088,1089,1090,1091,1092,1093,1094,1095,1096,1097,1098,1099,1100,1101,1102,1103,1104,1105,1106,1107,1108,1109,1110,1111,1112,1113,1114,1115,1116,1117,1118,1119,1120,1121,1122,1123,1124,1125,1126,1127,1128,1129,1130,1131,1132,1133,1134,1135,1136,1137,1138,1139,1140,1141,1142,1143,1144,1145,1146,1147,1148,1149,1150,1151,1152,1153,1154,1155],
				[1156,1157,1158,1159,1160,1161],
				[1162,1163,1164,1165,1166,1167],
				[1168,1169,1170,1171,1172,1173],
				[1174,1175,1176,1177,1178],
				[1179,1180,1181,1182,1183],
				[1184,1185,1186,1187,1188],
				[1189,1190,1191,1192,1193],
				[1194,1195,1196,1197,1198],
				[1199,1200,1201,1202,1203],
				[1204,1205,1206,1207,1208],
				[1209,1210,1211,1212,1213],
				[1214,1215,1216,1217,1218],
				[1219,1220,1221,1222,1223],
				[1224,1225,1226,1227,1228],
				[1229,1230,1231,1232,1233],
				[1234,1235,1236,1237,1238],
				[1239,1240,1241,1242,1243],
				[1244,1245,1246,1247,1248,1249],
				[1250,1251,1252,1253,1254,1255],
				[1256,1257,1258,1259,1260,1261]];
path32_1_points = [[-19.878755,9.261080],[-19.927175,9.212680],[-19.937625,9.223180],[-19.878755,9.261180],[-19.878755,9.261080]];
path32_2_points = [[19.942148,9.223080],[19.931748,9.212580],[19.883348,9.260980],[19.942248,9.222980],[19.942148,9.223080]];
path32_3_points = [[-19.989436,9.180480],[-20.134704,9.035210],[-20.279973,8.897900],[-20.142662,9.043170],[-19.989436,9.180480],[-19.989436,9.180480]];
path32_4_points = [[20.146148,9.050090],[20.268578,8.911740],[20.118478,9.050090],[19.996038,9.188440],[20.146148,9.050090],[20.146148,9.050090]];
path32_5_points = [[-20.266138,8.873620],[-20.314558,8.825220],[-20.325008,8.835620],[-20.266138,8.873620],[-20.266138,8.873620]];
path32_6_points = [[20.329538,8.835620],[20.319138,8.825220],[20.270738,8.873620],[20.329638,8.835620],[20.329538,8.835620]];
path32_7_points = [[-24.330123,-3.754200],[-24.340573,-3.764600],[-24.388993,-3.716200],[-24.330123,-3.754200],[-24.330123,-3.754200]];
path32_8_points = [[24.393518,-3.716200],[24.345118,-3.764600],[24.334718,-3.754200],[24.393618,-3.716200],[24.393518,-3.716200]];
path32_9_points = [[-20.653520,-3.771500],[-20.701940,-3.819900],[-20.712390,-3.809500],[-20.653520,-3.771500],[-20.653520,-3.771500]];
path32_10_points = [[20.716918,-3.809500],[20.706518,-3.819900],[20.668518,-3.761000],[20.716918,-3.809400],[20.716918,-3.809500]];
path32_11_points = [[-24.181467,-3.927100],[-24.087227,-4.037780],[-24.209139,-3.927100],[-24.303379,-3.816420],[-24.181467,-3.927100],[-24.181467,-3.927100]];
path32_12_points = [[24.310508,-3.824640],[24.192908,-3.942240],[24.075308,-4.051620],[24.184688,-3.934020],[24.310508,-3.824640],[24.310508,-3.824640]];
path32_13_points = [[-20.736531,-3.881340],[-20.798791,-3.943640],[-20.861051,-3.996340],[-20.808341,-3.934040],[-20.736541,-3.881340],[-20.736531,-3.881340]];
path32_14_points = [[-20.874881,-3.992940],[-20.923301,-4.041340],[-20.933751,-4.030940],[-20.874881,-3.992940],[-20.874881,-3.992940]];
path32_15_points = [[20.938278,-4.030940],[20.927878,-4.041340],[20.879478,-3.992940],[20.938378,-4.030940],[20.938278,-4.030940]];
path32_16_points = [[-16.004931,-6.400220],[-16.053351,-6.448620],[-16.063801,-6.438220],[-16.004931,-6.400220],[-16.004931,-6.400220]];
path32_17_points = [[16.068328,-6.438220],[16.057828,-6.448620],[16.009428,-6.400220],[16.068328,-6.438220],[16.068328,-6.438220]];
path32_18_points = [[-16.226293,-6.704620],[-16.274713,-6.753020],[-16.285163,-6.742620],[-16.226293,-6.704620],[-16.226293,-6.704620]];
path32_19_points = [[16.289688,-6.742620],[16.279188,-6.753020],[16.230788,-6.704620],[16.289688,-6.742620],[16.289688,-6.742620]];
path32_20_points = [[-16.309303,-6.815320],[-16.357723,-6.863720],[-16.368173,-6.853220],[-16.309303,-6.815220],[-16.309303,-6.815320]];
path32_21_points = [[16.372698,-6.853320],[16.362298,-6.863820],[16.313898,-6.815420],[16.372798,-6.853420],[16.372698,-6.853320]];
path32_22_points = [[17.780348,6.634250],[17.870248,6.544350],[17.960148,6.463050],[17.878848,6.552950],[17.780248,6.634250],[17.780348,6.634250]];

module poly_path32(h, w, res=4)  {
  scale([profile_scale, -profile_scale, 1])
  union()  {
    linear_extrude(height=h)
      polygon(path32_0_points, path32_0_paths);
    linear_extrude(height=h)
      polygon(path32_1_points);
    linear_extrude(height=h)
      polygon(path32_2_points);
    linear_extrude(height=h)
      polygon(path32_3_points);
    linear_extrude(height=h)
      polygon(path32_4_points);
    linear_extrude(height=h)
      polygon(path32_5_points);
    linear_extrude(height=h)
      polygon(path32_6_points);
    linear_extrude(height=h)
      polygon(path32_7_points);
    linear_extrude(height=h)
      polygon(path32_8_points);
    linear_extrude(height=h)
      polygon(path32_9_points);
    linear_extrude(height=h)
      polygon(path32_10_points);
    linear_extrude(height=h)
      polygon(path32_11_points);
    linear_extrude(height=h)
      polygon(path32_12_points);
    linear_extrude(height=h)
      polygon(path32_13_points);
    linear_extrude(height=h)
      polygon(path32_14_points);
    linear_extrude(height=h)
      polygon(path32_15_points);
    linear_extrude(height=h)
      polygon(path32_16_points);
    linear_extrude(height=h)
      polygon(path32_17_points);
    linear_extrude(height=h)
      polygon(path32_18_points);
    linear_extrude(height=h)
      polygon(path32_19_points);
    linear_extrude(height=h)
      polygon(path32_20_points);
    linear_extrude(height=h)
      polygon(path32_21_points);
    linear_extrude(height=h)
      polygon(path32_22_points);
  }
}

// The shapes
poly_path32(height, width);
